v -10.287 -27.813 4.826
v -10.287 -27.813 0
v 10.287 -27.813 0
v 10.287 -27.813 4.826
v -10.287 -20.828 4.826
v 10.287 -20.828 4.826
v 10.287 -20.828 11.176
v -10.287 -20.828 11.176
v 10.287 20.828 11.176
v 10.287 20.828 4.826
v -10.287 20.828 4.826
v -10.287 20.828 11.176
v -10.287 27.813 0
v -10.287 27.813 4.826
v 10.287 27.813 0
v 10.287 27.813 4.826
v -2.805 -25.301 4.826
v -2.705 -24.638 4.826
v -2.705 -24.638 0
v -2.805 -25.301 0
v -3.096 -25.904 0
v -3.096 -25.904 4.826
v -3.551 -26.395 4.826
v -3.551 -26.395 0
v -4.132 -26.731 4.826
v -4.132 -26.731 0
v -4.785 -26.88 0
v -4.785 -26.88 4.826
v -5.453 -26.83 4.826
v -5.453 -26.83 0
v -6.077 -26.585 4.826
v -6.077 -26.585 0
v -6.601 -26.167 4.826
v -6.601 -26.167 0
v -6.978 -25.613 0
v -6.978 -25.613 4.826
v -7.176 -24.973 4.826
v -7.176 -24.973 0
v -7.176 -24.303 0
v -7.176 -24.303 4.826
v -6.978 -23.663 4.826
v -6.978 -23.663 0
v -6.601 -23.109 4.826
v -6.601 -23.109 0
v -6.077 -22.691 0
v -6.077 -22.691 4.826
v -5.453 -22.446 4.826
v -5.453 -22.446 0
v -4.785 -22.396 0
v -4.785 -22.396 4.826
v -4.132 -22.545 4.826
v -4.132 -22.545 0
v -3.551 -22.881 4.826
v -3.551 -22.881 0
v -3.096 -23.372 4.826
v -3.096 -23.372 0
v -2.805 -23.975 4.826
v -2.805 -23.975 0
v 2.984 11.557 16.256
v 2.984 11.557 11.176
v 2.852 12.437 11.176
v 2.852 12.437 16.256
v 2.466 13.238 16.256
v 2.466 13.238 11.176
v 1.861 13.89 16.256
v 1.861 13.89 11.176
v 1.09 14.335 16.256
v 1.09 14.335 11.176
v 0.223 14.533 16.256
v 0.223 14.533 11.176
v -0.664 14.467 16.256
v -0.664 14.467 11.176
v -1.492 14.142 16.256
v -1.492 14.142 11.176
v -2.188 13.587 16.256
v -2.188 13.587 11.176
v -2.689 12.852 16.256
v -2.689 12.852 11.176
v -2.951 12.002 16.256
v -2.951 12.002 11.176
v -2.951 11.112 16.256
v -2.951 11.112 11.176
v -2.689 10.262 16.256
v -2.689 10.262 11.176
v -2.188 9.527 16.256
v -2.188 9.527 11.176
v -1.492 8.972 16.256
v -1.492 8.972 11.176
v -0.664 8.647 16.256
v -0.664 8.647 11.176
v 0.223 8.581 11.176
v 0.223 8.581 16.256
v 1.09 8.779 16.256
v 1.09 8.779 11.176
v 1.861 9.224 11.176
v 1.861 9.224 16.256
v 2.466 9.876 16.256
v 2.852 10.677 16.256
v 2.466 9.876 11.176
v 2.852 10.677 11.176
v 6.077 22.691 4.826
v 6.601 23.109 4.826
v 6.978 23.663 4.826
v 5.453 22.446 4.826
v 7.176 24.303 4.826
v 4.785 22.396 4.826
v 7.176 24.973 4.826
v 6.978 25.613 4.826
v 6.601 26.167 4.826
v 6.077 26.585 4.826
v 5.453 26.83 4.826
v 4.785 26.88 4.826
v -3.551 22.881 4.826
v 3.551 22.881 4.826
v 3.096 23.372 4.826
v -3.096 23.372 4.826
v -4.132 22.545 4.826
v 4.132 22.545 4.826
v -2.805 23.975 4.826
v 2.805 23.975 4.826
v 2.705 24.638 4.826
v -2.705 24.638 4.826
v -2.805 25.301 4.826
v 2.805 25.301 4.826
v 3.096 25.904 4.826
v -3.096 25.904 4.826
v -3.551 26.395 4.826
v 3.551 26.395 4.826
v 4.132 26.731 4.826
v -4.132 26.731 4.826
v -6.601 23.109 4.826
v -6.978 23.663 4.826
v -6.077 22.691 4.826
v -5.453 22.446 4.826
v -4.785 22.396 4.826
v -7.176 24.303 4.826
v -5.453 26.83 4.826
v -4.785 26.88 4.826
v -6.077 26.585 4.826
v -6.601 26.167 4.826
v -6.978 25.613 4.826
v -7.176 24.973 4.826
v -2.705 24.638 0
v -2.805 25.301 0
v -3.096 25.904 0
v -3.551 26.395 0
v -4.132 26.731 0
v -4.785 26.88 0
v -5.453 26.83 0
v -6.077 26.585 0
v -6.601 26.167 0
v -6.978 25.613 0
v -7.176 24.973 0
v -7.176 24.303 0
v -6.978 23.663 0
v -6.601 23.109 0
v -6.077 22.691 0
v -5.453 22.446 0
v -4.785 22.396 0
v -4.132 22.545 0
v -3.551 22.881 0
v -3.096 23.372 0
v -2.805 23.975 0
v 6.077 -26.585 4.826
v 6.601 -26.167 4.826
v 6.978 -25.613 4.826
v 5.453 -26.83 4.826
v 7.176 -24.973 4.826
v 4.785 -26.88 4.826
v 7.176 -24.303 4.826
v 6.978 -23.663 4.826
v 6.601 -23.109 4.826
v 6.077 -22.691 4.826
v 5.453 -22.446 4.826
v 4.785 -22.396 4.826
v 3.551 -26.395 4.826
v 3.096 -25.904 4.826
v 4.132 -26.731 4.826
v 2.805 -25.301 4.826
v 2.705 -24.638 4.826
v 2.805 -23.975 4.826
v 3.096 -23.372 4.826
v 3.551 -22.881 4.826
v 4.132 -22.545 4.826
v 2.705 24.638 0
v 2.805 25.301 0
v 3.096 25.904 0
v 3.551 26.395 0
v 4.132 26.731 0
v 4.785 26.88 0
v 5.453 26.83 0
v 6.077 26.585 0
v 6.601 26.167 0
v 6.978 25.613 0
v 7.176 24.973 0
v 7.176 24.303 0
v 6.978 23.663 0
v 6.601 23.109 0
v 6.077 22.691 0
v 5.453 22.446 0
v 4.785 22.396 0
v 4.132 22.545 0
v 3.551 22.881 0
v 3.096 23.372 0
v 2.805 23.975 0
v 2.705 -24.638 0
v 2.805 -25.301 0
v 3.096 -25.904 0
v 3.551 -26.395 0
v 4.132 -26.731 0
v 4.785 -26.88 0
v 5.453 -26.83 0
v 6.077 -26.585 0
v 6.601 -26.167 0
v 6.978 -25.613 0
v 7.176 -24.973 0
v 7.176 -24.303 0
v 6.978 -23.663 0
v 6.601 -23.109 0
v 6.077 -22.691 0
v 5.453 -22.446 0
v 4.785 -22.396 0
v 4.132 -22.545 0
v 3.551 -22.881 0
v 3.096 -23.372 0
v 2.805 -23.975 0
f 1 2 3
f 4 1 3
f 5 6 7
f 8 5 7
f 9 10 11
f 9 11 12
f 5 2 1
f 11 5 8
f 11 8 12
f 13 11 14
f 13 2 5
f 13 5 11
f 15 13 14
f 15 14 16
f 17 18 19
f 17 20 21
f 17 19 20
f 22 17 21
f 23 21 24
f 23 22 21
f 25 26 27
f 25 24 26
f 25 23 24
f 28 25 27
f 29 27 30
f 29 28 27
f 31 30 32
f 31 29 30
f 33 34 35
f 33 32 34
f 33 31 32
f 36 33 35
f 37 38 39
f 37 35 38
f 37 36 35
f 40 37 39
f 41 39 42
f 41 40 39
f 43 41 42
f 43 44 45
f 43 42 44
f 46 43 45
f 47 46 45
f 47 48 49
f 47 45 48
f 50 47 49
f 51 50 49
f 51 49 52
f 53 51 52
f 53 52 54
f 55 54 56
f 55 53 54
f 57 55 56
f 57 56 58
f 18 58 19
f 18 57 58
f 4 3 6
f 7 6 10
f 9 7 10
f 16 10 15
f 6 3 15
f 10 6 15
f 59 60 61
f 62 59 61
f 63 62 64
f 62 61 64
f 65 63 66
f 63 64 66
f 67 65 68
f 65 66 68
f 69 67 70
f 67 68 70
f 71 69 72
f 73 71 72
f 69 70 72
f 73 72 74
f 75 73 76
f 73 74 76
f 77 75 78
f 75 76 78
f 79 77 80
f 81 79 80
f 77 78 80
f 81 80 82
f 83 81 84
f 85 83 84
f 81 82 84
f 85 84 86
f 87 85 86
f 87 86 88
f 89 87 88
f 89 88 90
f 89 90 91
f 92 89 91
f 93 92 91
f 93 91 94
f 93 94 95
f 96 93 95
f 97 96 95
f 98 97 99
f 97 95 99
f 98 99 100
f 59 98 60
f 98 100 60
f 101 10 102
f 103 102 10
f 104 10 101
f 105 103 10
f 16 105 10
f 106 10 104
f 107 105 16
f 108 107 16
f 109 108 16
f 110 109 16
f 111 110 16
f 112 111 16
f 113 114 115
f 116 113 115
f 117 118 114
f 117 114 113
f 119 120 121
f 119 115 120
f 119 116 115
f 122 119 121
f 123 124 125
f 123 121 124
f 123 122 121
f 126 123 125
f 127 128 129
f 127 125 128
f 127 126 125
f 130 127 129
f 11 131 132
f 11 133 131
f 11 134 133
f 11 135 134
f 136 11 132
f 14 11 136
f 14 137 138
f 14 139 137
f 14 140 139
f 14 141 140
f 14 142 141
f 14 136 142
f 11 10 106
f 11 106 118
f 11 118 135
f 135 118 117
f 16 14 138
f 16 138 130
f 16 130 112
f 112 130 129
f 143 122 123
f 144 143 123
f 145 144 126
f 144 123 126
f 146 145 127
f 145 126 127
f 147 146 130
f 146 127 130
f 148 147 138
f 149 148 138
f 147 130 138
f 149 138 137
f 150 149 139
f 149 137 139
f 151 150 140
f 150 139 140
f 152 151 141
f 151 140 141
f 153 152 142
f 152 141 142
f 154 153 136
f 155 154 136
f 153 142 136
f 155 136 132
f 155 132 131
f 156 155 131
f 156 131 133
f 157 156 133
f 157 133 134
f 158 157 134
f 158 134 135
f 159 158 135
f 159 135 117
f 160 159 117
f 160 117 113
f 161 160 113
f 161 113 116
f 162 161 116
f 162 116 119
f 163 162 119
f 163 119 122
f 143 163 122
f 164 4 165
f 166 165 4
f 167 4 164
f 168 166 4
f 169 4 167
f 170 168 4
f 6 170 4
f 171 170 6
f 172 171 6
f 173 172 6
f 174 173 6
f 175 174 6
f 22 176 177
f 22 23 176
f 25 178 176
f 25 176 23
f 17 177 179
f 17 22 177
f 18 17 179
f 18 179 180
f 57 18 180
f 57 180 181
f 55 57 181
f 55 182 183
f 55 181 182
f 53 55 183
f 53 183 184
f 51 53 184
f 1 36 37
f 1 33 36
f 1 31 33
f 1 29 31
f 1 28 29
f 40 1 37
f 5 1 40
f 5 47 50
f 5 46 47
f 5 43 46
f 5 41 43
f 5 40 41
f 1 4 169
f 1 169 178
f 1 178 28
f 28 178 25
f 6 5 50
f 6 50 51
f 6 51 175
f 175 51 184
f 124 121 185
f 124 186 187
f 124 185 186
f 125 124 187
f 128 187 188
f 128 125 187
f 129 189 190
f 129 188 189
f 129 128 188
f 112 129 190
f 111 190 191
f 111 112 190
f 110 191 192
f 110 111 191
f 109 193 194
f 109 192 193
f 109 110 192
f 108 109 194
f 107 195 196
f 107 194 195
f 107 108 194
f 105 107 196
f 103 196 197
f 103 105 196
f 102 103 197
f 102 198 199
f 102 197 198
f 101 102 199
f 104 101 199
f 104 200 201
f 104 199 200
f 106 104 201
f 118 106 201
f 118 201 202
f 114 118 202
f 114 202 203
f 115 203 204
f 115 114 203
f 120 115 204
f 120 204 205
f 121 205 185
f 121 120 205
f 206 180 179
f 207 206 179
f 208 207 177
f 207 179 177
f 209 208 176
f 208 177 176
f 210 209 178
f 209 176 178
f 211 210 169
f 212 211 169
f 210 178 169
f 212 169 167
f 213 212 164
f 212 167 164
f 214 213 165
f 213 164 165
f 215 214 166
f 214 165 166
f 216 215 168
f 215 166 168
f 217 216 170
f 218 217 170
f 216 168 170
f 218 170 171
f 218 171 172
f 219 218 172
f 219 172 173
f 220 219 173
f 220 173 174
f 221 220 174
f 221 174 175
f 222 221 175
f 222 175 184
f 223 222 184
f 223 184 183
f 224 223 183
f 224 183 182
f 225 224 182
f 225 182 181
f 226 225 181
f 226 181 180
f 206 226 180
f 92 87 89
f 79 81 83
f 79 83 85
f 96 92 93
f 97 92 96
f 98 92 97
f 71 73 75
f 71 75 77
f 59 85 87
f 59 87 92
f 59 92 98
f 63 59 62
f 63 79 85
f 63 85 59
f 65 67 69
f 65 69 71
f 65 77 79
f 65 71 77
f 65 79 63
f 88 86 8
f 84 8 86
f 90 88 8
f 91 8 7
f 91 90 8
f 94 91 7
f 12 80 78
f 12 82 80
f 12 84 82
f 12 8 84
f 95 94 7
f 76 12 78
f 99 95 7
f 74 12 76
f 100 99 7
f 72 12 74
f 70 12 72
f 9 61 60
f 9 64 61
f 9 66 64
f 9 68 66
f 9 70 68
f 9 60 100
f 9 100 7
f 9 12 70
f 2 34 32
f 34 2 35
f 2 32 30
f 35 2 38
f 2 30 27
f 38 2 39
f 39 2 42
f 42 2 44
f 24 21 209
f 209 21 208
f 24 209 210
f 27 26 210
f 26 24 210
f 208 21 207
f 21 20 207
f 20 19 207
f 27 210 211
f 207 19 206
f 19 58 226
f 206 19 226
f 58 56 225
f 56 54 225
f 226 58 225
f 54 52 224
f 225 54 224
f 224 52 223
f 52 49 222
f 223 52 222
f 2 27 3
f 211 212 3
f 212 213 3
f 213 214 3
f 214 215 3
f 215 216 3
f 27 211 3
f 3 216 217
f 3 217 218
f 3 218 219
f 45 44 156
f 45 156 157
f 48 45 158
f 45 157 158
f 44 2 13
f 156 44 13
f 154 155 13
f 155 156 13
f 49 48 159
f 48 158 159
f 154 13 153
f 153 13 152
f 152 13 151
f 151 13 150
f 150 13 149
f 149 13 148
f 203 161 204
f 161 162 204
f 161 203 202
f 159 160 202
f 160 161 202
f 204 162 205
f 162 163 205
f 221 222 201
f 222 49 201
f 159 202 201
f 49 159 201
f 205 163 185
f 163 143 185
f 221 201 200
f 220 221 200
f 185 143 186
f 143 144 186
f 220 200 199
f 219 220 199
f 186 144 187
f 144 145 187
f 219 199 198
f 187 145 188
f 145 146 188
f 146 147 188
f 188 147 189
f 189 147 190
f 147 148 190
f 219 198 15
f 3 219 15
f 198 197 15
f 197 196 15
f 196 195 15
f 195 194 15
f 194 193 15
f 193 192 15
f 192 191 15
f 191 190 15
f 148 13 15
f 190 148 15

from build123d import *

# Parameters (mm, degrees)
SKETCH1_W             = 20.574
SKETCH1_H             = 55.626
BOSS_EXTRUDE1_DEPTH   = 11.176
SKETCH2_R             = 2.9845
BOSS_EXTRUDE2_DEPTH   = 5.08
F_8_CLEARANCE_HOLE1_D = 4.4958
MIRROR2_COPY_1_D      = 4.4958
SKETCH6_W             = 6.35
SKETCH6_H             = 6.985
CUT_EXTRUDE1_DEPTH    = 21.574


with BuildPart() as part:
    # Sketch1 → Boss-Extrude1 (new body)
    with BuildSketch(Plane.XY):
        Rectangle(SKETCH1_W, SKETCH1_H)
    extrude(amount=BOSS_EXTRUDE1_DEPTH)

    # Sketch2 → Boss-Extrude2 (add)
    with BuildSketch(Plane.XY.offset(11.176)):
        with Locations((0, 11.557)):
            Circle(SKETCH2_R)
    extrude(amount=BOSS_EXTRUDE2_DEPTH)

    # #8 Clearance Hole1 (through all)
    with Locations(Plane(origin=(0, 0, 0), x_dir=(-1, 0, 0), z_dir=(0, 0, -1))):
        with Locations((4.953, 24.638)):
            f_8_clearance_hole1 = Hole(F_8_CLEARANCE_HOLE1_D / 2)

    # Mirror1: #8 Clearance Hole1 across plane
    add(f_8_clearance_hole1.mirror(Plane(origin=(0, 0, 0), x_dir=(0, 0, 1), z_dir=(1, 0, 0))), mode=Mode.SUBTRACT)

    # Mirror2: #8 Clearance Hole1 across plane
    add(f_8_clearance_hole1.mirror(Plane.ZX), mode=Mode.SUBTRACT)

    # Mirror2 copy 1 (through all)
    with Locations(Plane(origin=(0, 0, 0), x_dir=(1, 0, 0), z_dir=(0, 0, -1))):
        with Locations((4.953, 24.638)):
            Hole(MIRROR2_COPY_1_D / 2)

    # Sketch6 → Cut-Extrude1 (cut, through all)
    with BuildSketch(Plane.ZY.offset(10.287)):
        with Locations((8.001, -24.3205)):
            Rectangle(SKETCH6_W, SKETCH6_H)
        with Locations((8.001, 24.3205)):
            Rectangle(SKETCH6_W, SKETCH6_H)
    extrude(amount=-CUT_EXTRUDE1_DEPTH, mode=Mode.SUBTRACT)


solid = part.part
